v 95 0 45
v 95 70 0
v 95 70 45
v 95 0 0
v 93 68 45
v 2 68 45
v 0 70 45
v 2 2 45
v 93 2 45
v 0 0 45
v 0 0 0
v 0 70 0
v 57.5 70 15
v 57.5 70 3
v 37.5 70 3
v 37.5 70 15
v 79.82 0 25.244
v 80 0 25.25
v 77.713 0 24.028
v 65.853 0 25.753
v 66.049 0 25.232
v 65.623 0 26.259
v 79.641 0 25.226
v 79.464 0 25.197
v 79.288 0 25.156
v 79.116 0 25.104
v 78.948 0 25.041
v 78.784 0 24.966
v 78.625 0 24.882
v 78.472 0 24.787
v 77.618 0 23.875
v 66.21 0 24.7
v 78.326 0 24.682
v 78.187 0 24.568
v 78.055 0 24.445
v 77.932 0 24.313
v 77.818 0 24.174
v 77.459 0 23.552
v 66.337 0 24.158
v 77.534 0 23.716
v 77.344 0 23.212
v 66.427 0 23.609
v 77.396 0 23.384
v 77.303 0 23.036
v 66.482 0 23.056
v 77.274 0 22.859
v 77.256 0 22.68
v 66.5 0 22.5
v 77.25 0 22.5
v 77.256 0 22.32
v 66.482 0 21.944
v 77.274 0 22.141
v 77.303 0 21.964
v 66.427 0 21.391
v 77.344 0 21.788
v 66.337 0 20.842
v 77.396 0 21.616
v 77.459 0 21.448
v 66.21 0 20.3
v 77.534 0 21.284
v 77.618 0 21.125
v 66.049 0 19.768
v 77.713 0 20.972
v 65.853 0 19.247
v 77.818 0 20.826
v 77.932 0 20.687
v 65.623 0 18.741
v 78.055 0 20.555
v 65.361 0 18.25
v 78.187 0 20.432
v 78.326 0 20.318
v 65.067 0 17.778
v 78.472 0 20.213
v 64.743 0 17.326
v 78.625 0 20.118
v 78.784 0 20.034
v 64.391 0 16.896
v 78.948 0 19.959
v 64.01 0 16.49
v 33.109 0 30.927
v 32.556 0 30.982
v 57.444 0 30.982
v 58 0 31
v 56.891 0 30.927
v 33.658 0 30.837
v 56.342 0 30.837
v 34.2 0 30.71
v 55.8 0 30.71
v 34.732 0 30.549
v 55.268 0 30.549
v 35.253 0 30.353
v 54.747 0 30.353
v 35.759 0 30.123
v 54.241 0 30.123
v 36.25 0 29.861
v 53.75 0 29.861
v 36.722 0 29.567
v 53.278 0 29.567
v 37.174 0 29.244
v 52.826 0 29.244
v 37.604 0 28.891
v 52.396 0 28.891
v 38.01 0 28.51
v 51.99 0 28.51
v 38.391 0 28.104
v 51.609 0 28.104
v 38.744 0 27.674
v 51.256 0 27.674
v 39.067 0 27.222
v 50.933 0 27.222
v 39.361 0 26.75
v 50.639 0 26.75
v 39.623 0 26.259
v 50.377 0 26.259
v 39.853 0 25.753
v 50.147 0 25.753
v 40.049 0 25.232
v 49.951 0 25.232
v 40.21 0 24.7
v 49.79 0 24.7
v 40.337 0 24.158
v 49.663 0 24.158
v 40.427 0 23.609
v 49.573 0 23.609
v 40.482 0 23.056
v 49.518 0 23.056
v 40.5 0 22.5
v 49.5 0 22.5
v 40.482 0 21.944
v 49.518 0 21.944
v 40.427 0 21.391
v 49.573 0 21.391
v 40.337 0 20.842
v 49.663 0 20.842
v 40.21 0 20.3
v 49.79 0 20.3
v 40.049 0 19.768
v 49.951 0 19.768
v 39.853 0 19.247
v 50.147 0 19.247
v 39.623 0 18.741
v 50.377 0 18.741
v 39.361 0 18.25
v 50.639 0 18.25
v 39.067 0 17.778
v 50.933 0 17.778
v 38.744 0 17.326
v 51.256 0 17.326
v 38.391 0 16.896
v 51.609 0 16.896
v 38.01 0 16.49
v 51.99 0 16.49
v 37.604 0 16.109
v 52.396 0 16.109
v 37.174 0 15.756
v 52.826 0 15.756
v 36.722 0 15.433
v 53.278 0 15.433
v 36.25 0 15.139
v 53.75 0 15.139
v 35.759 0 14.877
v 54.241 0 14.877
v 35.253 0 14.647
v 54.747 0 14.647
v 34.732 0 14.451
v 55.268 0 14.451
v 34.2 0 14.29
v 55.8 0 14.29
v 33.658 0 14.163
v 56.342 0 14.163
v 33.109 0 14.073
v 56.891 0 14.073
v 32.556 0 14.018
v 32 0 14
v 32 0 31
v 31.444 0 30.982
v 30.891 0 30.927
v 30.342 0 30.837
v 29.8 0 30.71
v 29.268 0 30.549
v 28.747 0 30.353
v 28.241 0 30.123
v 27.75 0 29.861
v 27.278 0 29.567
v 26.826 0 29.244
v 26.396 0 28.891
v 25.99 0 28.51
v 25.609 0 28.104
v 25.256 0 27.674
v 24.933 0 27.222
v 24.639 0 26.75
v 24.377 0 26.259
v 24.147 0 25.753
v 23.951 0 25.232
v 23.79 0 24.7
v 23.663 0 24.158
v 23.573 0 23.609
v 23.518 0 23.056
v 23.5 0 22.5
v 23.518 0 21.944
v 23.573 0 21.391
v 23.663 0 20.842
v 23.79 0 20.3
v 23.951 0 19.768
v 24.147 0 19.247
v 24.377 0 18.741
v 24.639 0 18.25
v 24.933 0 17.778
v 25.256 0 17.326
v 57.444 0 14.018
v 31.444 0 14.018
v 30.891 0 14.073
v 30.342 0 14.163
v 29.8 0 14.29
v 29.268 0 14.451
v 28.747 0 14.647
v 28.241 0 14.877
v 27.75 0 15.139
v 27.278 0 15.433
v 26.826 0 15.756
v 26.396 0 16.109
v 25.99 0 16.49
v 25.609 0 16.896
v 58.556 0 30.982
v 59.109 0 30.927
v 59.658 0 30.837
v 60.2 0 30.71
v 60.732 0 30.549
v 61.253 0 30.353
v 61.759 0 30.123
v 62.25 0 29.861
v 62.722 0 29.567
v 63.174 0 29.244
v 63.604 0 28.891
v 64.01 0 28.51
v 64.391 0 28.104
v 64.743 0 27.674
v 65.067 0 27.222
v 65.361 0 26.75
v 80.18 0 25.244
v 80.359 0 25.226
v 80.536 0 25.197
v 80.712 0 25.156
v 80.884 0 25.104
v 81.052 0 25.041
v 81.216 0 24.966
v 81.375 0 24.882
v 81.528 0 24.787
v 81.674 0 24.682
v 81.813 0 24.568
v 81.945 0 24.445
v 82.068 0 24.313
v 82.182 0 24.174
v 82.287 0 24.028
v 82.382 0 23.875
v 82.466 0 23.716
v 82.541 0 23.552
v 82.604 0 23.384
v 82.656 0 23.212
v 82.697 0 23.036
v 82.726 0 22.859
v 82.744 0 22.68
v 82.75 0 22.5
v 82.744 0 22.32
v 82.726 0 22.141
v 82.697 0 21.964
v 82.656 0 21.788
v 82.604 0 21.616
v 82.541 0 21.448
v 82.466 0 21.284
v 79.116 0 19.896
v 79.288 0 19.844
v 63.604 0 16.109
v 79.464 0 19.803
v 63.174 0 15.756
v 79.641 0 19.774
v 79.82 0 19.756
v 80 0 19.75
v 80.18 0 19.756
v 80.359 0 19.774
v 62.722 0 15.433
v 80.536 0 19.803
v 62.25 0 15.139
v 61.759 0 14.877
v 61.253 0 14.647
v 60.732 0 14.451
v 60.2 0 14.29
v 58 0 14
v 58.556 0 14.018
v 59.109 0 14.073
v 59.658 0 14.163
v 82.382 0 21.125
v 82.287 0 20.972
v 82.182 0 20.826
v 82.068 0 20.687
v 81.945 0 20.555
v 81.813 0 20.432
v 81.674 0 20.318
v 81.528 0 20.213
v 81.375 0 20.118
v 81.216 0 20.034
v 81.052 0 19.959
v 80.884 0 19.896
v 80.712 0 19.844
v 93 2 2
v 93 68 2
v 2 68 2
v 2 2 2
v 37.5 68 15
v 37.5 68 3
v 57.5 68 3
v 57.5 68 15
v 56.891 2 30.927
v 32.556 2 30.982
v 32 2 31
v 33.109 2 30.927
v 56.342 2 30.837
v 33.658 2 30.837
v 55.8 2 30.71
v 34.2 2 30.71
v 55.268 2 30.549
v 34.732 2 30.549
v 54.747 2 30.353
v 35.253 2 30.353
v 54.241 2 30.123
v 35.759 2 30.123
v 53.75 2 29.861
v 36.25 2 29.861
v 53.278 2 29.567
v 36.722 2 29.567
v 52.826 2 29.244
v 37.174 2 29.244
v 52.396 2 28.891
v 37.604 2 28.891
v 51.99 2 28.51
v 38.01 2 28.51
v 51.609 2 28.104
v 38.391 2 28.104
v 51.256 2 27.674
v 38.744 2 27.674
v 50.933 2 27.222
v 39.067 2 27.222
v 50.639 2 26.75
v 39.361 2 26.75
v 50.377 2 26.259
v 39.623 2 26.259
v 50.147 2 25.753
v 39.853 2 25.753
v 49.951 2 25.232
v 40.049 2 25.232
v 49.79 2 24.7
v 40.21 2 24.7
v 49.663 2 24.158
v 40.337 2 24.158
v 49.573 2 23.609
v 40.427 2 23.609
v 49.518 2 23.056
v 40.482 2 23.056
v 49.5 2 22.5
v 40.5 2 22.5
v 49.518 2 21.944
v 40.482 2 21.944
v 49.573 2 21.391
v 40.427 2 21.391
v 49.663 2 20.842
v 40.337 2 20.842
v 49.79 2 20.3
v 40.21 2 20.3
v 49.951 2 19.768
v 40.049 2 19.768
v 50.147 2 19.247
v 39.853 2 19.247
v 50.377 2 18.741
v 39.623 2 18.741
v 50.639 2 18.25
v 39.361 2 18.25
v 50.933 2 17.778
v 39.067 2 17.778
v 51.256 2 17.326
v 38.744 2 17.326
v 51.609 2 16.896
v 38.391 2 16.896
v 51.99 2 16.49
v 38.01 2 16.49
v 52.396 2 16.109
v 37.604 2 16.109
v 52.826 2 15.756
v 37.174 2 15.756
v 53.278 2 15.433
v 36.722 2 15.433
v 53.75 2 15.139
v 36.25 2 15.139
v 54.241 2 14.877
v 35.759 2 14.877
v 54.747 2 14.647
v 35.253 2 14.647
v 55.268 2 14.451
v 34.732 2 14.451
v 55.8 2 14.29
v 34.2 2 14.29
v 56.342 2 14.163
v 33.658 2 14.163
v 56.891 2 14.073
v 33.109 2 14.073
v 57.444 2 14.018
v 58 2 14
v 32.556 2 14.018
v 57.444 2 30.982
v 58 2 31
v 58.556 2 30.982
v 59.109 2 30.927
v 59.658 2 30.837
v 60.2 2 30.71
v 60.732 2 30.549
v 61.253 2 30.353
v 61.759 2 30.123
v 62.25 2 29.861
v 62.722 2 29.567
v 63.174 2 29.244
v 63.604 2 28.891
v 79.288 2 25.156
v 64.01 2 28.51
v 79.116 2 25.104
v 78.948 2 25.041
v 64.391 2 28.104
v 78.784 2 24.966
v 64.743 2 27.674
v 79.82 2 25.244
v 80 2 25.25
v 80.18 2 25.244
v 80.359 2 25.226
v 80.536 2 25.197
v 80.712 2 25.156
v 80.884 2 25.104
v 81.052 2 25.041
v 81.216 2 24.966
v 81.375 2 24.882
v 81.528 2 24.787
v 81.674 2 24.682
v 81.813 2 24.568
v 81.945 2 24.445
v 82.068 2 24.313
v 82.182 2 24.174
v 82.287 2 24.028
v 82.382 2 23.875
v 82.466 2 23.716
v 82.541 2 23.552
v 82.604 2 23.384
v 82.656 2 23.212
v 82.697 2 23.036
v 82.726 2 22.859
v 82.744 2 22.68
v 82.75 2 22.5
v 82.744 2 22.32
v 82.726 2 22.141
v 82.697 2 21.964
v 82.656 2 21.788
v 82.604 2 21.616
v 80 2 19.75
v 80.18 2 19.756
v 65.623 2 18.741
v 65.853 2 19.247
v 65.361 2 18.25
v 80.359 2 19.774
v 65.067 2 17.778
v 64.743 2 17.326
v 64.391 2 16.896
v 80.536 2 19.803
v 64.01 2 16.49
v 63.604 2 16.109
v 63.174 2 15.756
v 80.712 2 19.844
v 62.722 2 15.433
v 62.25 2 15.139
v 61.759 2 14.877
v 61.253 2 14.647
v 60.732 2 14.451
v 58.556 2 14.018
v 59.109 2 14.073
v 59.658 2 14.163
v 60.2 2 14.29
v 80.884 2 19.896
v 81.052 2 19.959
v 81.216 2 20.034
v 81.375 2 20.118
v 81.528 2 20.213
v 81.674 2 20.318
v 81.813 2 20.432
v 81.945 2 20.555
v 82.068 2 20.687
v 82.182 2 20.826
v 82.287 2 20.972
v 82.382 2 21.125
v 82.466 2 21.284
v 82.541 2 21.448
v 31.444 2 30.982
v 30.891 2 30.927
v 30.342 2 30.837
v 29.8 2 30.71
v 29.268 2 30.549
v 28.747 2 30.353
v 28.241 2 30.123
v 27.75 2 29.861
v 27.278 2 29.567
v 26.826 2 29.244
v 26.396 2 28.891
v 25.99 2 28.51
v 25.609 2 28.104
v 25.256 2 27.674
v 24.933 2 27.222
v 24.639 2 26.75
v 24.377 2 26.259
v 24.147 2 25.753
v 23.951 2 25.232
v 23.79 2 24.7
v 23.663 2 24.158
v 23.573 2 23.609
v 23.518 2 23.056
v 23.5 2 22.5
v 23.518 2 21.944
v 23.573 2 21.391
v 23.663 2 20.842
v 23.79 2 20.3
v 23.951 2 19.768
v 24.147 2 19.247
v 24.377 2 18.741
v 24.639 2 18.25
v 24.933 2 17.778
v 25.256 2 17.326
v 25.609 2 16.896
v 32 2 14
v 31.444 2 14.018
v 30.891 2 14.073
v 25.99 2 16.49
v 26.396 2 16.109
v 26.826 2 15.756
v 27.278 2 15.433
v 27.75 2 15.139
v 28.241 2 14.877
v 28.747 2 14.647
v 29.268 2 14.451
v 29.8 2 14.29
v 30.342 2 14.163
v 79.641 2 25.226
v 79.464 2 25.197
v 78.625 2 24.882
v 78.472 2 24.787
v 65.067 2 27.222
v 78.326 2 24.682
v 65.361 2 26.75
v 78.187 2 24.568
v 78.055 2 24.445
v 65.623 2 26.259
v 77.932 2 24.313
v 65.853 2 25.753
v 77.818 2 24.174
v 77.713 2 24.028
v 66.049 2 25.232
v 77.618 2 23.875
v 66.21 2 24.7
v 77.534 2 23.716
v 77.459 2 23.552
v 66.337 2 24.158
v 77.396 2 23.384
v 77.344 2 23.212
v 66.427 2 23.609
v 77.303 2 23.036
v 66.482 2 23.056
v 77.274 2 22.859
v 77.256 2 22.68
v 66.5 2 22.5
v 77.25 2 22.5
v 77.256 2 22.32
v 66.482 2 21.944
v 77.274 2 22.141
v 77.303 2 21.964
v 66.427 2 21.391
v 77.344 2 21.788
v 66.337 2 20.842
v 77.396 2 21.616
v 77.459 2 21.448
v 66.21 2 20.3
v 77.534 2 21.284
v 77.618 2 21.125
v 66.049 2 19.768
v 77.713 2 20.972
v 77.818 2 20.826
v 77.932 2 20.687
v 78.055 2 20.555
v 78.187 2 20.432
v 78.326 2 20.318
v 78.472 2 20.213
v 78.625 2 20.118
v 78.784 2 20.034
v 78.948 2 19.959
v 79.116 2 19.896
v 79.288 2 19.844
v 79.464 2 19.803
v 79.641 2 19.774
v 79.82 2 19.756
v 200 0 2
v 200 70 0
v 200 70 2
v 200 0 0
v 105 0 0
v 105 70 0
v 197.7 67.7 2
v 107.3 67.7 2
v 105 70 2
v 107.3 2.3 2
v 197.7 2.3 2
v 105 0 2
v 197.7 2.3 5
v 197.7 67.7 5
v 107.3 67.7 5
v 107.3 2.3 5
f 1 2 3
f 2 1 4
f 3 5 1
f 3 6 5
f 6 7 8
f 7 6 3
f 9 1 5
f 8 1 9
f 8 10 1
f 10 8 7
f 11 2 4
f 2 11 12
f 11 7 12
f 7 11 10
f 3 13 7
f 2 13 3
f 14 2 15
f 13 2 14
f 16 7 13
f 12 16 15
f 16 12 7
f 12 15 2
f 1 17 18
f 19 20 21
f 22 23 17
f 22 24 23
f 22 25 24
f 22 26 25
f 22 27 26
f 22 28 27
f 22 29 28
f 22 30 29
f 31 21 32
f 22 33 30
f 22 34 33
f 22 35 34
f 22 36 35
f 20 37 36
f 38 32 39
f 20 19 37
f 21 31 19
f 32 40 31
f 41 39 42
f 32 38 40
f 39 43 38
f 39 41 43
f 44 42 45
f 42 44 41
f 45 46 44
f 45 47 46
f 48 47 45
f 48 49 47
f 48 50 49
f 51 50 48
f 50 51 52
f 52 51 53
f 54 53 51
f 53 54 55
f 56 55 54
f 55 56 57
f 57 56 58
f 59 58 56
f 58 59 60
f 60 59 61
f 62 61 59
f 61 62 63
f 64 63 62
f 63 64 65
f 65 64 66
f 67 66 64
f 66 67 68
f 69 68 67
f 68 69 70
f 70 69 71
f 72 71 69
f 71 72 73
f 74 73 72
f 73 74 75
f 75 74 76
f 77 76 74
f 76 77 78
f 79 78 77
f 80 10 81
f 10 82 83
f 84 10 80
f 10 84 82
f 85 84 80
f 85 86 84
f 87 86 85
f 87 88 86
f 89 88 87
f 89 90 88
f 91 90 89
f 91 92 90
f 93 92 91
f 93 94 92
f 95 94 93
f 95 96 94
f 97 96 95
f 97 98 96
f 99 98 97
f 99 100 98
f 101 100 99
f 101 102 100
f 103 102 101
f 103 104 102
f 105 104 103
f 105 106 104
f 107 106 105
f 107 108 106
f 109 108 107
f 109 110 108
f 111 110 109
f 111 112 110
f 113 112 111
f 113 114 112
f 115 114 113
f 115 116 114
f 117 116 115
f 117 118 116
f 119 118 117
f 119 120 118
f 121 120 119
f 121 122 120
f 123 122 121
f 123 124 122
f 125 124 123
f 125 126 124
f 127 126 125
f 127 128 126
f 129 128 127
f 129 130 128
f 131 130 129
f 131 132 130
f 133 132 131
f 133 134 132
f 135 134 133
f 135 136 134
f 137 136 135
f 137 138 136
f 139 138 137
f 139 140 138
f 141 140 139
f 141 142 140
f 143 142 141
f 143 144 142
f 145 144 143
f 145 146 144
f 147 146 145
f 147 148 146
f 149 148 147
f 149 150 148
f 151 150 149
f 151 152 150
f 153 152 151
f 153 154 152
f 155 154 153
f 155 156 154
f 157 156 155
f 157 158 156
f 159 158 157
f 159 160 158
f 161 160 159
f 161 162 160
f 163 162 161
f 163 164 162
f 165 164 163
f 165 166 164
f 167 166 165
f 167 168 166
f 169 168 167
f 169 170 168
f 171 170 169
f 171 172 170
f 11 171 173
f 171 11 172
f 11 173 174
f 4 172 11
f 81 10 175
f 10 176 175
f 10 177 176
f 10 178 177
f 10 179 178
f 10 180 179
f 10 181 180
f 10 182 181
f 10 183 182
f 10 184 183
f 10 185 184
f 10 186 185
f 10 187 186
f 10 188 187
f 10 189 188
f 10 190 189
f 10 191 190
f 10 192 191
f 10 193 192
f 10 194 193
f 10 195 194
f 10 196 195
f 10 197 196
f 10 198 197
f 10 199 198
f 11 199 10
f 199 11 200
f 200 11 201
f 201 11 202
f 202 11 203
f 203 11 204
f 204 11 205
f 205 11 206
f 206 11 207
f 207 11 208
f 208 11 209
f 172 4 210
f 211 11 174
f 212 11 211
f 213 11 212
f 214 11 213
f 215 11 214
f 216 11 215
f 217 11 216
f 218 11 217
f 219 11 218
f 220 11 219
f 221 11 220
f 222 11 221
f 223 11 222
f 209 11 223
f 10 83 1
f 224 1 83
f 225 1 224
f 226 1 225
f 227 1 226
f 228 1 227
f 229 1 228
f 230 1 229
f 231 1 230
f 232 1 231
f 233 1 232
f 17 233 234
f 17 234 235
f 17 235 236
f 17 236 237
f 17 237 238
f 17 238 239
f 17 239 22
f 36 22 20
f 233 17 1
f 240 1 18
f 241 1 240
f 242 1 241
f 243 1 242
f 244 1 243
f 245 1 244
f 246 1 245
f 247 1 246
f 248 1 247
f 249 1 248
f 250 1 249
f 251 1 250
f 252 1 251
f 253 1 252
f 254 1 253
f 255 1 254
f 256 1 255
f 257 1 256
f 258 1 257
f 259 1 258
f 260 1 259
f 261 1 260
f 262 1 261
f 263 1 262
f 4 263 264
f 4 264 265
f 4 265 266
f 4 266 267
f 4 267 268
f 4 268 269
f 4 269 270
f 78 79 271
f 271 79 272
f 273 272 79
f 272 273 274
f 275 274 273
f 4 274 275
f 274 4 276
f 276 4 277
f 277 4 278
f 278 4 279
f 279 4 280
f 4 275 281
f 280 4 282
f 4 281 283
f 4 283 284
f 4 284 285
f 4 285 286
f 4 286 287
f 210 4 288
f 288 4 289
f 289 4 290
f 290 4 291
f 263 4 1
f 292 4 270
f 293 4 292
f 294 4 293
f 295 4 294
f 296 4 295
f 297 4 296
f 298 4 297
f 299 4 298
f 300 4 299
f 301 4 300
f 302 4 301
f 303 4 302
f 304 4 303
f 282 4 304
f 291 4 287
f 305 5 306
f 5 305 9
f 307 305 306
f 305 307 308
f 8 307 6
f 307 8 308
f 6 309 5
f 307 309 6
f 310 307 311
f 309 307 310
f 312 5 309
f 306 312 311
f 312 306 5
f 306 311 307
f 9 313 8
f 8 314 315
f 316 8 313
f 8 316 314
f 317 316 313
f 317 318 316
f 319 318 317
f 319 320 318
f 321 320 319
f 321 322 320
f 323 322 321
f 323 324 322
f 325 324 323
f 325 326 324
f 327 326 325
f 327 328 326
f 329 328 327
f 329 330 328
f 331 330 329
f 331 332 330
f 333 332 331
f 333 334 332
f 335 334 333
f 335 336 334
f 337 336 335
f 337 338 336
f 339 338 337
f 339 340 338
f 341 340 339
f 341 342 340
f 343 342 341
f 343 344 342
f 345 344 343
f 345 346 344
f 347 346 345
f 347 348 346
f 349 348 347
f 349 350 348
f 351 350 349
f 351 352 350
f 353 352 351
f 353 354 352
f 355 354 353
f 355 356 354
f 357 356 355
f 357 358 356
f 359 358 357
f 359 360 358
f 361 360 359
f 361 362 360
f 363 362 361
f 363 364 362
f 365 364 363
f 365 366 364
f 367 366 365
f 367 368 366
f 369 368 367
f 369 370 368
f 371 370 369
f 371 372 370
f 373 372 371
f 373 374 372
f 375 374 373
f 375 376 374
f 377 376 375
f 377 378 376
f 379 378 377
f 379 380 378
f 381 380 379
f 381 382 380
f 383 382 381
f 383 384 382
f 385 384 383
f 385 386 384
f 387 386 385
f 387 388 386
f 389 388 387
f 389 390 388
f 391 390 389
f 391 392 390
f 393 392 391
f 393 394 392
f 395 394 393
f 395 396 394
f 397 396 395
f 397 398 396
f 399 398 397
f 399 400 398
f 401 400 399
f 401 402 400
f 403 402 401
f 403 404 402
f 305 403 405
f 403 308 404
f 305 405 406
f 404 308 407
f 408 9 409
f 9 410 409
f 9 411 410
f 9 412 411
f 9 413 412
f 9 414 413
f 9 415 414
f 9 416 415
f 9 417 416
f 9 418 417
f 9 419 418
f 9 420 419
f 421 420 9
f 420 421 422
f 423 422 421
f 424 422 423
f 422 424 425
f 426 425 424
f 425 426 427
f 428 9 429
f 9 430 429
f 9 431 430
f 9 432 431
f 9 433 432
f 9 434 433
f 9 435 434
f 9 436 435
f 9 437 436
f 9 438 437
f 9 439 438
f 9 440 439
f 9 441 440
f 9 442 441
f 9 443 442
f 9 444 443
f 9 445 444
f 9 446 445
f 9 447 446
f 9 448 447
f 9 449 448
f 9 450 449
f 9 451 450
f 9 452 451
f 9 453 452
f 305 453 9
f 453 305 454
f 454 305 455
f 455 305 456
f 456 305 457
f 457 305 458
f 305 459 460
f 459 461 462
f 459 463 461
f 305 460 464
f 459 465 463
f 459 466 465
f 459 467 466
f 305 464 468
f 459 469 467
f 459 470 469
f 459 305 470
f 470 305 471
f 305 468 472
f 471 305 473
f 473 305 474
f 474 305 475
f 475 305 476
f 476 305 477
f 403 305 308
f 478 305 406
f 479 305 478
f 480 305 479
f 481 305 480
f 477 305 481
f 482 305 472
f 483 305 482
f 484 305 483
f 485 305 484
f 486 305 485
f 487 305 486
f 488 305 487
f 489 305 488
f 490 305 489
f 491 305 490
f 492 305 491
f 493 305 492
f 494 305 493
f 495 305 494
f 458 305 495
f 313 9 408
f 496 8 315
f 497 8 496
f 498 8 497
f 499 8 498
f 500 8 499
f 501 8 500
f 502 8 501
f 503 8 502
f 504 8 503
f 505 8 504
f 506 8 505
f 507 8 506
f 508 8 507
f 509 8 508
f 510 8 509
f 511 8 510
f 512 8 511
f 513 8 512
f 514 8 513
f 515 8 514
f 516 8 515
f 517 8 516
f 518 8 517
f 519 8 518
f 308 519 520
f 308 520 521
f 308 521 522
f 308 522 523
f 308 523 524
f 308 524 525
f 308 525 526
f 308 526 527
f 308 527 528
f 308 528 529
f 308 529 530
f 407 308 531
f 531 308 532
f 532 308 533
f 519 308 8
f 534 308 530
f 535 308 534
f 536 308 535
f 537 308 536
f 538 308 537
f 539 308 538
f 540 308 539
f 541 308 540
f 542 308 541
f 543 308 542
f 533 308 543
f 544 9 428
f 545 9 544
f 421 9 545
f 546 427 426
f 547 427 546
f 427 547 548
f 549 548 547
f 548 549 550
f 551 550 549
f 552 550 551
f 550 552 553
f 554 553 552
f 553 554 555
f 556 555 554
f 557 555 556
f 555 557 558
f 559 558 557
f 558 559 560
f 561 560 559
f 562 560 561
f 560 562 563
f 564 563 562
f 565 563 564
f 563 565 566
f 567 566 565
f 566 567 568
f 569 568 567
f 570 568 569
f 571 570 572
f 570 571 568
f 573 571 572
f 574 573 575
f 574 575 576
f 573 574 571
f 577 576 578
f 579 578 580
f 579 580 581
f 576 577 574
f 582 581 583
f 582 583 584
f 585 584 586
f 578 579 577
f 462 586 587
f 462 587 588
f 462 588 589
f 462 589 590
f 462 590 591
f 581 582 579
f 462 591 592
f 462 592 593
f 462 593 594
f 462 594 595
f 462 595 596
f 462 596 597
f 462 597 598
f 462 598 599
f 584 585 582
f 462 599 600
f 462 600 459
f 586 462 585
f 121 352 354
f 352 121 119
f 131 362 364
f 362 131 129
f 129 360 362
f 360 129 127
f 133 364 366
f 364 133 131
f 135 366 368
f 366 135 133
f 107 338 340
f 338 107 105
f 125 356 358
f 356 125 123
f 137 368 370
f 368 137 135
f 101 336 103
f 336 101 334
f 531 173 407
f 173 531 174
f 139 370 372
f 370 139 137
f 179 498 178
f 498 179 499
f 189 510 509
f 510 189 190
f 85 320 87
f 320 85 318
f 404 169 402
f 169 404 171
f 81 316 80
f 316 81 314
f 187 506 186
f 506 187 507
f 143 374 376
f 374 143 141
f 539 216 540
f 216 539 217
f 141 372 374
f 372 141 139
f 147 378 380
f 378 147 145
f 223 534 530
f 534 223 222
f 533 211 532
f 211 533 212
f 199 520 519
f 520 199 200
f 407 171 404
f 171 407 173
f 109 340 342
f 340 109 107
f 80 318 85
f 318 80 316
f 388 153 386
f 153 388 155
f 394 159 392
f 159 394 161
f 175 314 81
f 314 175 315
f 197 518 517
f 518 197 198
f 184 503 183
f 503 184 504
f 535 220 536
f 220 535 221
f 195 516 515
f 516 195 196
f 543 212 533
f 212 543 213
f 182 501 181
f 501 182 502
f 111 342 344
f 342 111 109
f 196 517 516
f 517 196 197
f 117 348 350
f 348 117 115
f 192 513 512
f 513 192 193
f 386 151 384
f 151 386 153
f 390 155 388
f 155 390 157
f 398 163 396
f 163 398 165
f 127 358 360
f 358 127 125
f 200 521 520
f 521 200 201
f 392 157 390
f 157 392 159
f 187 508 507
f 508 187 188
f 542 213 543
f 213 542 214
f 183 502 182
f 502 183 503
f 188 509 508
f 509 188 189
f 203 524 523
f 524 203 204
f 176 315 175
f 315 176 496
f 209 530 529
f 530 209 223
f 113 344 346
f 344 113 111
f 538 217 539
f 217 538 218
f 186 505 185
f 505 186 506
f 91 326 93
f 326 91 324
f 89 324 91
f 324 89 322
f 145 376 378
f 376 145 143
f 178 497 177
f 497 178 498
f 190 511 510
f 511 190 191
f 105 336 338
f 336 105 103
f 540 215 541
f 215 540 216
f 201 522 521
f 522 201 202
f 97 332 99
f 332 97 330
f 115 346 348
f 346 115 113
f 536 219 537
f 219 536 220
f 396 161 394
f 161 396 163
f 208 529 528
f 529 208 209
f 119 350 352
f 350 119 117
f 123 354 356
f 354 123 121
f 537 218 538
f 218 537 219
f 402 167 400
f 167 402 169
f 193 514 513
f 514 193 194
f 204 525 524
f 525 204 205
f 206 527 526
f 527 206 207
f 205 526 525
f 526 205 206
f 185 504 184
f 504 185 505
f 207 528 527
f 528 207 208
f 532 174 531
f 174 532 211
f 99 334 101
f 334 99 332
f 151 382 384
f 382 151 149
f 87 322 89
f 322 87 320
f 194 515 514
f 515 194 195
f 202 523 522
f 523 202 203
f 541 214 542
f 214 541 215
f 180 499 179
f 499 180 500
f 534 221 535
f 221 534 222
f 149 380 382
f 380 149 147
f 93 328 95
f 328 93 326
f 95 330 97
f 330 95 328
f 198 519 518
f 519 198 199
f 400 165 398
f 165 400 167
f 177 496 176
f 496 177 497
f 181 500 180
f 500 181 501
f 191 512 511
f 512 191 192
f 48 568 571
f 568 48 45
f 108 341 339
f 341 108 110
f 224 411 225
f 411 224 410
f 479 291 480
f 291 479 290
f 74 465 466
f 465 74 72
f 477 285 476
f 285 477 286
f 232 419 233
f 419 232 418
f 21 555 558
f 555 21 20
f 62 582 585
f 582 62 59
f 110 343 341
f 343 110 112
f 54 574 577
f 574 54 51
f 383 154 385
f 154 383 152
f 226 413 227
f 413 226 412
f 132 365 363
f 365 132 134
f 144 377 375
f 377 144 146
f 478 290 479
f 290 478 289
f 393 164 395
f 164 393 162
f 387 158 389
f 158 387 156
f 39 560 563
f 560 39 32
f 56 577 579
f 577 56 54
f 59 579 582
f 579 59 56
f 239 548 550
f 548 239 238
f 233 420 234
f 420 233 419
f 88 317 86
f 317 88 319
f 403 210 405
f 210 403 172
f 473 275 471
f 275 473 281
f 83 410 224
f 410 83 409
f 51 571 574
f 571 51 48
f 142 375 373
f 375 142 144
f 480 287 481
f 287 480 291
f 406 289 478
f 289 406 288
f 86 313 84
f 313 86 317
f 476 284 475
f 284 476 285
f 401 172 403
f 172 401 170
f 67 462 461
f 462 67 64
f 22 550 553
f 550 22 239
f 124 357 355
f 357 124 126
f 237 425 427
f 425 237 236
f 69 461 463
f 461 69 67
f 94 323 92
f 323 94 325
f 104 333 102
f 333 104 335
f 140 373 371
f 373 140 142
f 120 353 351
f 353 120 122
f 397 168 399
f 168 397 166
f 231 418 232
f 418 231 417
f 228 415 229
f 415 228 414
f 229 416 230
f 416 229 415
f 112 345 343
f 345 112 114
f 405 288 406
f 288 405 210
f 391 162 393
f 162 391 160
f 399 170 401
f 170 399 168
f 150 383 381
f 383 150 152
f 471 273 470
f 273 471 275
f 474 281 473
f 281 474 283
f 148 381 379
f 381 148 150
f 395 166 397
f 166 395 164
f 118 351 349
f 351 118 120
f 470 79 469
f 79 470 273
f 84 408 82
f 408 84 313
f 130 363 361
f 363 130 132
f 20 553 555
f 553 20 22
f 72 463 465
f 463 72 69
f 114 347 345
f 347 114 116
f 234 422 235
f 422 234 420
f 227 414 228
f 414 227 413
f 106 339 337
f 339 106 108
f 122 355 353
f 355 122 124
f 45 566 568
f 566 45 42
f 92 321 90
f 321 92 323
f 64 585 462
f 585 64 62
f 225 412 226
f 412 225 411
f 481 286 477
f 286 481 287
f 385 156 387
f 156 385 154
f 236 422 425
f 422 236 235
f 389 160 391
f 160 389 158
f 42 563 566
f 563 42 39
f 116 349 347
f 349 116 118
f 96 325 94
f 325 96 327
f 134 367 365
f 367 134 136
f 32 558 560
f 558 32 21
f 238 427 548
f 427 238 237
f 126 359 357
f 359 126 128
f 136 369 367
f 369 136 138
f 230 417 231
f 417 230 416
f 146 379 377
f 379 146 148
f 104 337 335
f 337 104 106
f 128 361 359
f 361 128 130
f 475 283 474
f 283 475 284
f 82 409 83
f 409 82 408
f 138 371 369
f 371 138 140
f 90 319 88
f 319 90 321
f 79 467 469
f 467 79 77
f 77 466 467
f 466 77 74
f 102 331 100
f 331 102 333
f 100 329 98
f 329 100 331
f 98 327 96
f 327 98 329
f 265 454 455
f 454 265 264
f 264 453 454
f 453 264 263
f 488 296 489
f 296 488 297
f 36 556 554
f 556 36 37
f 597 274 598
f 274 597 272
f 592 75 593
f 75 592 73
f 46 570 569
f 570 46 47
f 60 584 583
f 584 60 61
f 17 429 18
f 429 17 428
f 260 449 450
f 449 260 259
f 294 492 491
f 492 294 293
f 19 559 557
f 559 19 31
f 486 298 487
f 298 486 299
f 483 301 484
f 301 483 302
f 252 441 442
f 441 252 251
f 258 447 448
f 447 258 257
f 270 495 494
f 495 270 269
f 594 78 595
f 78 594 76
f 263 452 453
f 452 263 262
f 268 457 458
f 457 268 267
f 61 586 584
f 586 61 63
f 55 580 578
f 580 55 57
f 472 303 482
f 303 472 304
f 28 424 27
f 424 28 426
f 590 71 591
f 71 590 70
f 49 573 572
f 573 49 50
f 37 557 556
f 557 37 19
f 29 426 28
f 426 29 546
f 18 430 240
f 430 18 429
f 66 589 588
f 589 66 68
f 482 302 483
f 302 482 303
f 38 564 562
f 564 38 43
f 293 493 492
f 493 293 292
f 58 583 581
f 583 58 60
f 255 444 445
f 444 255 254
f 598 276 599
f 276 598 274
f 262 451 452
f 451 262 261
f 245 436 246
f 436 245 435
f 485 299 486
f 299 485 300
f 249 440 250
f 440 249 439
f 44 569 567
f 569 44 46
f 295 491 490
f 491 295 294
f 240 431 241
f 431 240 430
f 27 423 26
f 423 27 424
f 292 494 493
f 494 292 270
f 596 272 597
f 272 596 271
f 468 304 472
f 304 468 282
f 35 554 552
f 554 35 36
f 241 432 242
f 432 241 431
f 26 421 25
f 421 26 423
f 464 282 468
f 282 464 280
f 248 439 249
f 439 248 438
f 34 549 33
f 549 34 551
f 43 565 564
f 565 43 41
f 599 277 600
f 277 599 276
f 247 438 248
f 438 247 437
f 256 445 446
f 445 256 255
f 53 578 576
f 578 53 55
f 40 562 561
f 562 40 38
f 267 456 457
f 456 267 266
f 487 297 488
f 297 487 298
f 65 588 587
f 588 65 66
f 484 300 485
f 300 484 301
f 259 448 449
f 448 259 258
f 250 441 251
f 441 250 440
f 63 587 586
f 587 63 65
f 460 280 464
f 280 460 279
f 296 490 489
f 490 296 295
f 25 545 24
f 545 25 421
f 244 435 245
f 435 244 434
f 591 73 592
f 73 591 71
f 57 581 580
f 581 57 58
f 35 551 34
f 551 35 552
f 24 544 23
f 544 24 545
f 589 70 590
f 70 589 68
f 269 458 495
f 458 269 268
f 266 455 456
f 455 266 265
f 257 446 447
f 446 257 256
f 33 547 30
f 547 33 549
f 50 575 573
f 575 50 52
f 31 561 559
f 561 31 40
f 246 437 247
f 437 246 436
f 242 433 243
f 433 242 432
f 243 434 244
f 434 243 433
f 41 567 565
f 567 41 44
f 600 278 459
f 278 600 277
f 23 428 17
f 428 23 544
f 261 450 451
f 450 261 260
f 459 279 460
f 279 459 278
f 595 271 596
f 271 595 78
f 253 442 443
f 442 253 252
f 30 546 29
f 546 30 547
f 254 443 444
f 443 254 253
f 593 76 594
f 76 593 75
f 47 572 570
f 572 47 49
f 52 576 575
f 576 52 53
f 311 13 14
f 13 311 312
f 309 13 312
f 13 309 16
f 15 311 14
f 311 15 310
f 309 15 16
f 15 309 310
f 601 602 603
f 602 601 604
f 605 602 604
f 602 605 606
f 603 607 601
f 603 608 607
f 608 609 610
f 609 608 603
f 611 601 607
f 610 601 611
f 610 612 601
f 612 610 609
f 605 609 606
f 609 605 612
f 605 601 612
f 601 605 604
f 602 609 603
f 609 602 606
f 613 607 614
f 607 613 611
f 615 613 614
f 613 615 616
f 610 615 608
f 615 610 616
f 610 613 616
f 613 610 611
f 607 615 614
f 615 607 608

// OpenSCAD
// NUNAIT LABS - Proyecto 01
// Carcasa V1 para ESP32 + HC-SR04 + LED
// Unidades: mm

$fn = 96;

// Dimensiones exteriores
W = 95;
D = 70;
H = 45;

// Espesores
wall = 2.0;
floor_t = 2.0;
lid_t = 2.0;

// Holgura tapa
lid_clearance = 0.30;
lip_h = 3.0;

// Frontal
sensor_d = 17.0;         // un poco de holgura sobre 16 mm
sensor_x1 = 32;
sensor_x2 = 58;
sensor_z  = 22.5;

led_d = 5.5;
led_x = 80;
led_z = 22.5;

// Trasera: abertura baja para cable USB
usb_w = 20;
usb_h = 12;
usb_z = 3.0;

// Cuerpo principal
module body() {
    difference() {
        // caja exterior
        cube([W, D, H], center=false);

        // vaciado interior, abierto por arriba
        translate([wall, wall, floor_t])
            cube([W-2*wall, D-2*wall, H-floor_t+0.1], center=false);

        // agujeros frontales (frontal = y = 0)
        translate([sensor_x1, -0.1, sensor_z])
            rotate([-90,0,0]) cylinder(h=wall+0.2, d=sensor_d);
        translate([sensor_x2, -0.1, sensor_z])
            rotate([-90,0,0]) cylinder(h=wall+0.2, d=sensor_d);
        translate([led_x, -0.1, led_z])
            rotate([-90,0,0]) cylinder(h=wall+0.2, d=led_d);

        // hueco trasero USB / cable
        translate([(W-usb_w)/2, D-wall-0.1, usb_z])
            cube([usb_w, wall+0.2, usb_h], center=false);
    }
}

// Tapa plana con labio interior
module lid() {
    union() {
        cube([W, D, lid_t], center=false);
        translate([wall + lid_clearance, wall + lid_clearance, -lip_h])
            cube([
                W - 2*(wall + lid_clearance),
                D - 2*(wall + lid_clearance),
                lip_h
            ], center=false);
    }
}

// Export selector:
// BODY, LID, o BOTH
part = "BOTH";

if (part == "BODY") {
    body();
} else if (part == "LID") {
    // colocar con el labio hacia arriba para impresión sencilla
    translate([0, D, lid_t])
        rotate([180,0,0]) lid();
} else {
    body();
    // tapa al lado del cuerpo, separada 10 mm
    translate([W + 10, D, lid_t])
        rotate([180,0,0]) lid();
}
